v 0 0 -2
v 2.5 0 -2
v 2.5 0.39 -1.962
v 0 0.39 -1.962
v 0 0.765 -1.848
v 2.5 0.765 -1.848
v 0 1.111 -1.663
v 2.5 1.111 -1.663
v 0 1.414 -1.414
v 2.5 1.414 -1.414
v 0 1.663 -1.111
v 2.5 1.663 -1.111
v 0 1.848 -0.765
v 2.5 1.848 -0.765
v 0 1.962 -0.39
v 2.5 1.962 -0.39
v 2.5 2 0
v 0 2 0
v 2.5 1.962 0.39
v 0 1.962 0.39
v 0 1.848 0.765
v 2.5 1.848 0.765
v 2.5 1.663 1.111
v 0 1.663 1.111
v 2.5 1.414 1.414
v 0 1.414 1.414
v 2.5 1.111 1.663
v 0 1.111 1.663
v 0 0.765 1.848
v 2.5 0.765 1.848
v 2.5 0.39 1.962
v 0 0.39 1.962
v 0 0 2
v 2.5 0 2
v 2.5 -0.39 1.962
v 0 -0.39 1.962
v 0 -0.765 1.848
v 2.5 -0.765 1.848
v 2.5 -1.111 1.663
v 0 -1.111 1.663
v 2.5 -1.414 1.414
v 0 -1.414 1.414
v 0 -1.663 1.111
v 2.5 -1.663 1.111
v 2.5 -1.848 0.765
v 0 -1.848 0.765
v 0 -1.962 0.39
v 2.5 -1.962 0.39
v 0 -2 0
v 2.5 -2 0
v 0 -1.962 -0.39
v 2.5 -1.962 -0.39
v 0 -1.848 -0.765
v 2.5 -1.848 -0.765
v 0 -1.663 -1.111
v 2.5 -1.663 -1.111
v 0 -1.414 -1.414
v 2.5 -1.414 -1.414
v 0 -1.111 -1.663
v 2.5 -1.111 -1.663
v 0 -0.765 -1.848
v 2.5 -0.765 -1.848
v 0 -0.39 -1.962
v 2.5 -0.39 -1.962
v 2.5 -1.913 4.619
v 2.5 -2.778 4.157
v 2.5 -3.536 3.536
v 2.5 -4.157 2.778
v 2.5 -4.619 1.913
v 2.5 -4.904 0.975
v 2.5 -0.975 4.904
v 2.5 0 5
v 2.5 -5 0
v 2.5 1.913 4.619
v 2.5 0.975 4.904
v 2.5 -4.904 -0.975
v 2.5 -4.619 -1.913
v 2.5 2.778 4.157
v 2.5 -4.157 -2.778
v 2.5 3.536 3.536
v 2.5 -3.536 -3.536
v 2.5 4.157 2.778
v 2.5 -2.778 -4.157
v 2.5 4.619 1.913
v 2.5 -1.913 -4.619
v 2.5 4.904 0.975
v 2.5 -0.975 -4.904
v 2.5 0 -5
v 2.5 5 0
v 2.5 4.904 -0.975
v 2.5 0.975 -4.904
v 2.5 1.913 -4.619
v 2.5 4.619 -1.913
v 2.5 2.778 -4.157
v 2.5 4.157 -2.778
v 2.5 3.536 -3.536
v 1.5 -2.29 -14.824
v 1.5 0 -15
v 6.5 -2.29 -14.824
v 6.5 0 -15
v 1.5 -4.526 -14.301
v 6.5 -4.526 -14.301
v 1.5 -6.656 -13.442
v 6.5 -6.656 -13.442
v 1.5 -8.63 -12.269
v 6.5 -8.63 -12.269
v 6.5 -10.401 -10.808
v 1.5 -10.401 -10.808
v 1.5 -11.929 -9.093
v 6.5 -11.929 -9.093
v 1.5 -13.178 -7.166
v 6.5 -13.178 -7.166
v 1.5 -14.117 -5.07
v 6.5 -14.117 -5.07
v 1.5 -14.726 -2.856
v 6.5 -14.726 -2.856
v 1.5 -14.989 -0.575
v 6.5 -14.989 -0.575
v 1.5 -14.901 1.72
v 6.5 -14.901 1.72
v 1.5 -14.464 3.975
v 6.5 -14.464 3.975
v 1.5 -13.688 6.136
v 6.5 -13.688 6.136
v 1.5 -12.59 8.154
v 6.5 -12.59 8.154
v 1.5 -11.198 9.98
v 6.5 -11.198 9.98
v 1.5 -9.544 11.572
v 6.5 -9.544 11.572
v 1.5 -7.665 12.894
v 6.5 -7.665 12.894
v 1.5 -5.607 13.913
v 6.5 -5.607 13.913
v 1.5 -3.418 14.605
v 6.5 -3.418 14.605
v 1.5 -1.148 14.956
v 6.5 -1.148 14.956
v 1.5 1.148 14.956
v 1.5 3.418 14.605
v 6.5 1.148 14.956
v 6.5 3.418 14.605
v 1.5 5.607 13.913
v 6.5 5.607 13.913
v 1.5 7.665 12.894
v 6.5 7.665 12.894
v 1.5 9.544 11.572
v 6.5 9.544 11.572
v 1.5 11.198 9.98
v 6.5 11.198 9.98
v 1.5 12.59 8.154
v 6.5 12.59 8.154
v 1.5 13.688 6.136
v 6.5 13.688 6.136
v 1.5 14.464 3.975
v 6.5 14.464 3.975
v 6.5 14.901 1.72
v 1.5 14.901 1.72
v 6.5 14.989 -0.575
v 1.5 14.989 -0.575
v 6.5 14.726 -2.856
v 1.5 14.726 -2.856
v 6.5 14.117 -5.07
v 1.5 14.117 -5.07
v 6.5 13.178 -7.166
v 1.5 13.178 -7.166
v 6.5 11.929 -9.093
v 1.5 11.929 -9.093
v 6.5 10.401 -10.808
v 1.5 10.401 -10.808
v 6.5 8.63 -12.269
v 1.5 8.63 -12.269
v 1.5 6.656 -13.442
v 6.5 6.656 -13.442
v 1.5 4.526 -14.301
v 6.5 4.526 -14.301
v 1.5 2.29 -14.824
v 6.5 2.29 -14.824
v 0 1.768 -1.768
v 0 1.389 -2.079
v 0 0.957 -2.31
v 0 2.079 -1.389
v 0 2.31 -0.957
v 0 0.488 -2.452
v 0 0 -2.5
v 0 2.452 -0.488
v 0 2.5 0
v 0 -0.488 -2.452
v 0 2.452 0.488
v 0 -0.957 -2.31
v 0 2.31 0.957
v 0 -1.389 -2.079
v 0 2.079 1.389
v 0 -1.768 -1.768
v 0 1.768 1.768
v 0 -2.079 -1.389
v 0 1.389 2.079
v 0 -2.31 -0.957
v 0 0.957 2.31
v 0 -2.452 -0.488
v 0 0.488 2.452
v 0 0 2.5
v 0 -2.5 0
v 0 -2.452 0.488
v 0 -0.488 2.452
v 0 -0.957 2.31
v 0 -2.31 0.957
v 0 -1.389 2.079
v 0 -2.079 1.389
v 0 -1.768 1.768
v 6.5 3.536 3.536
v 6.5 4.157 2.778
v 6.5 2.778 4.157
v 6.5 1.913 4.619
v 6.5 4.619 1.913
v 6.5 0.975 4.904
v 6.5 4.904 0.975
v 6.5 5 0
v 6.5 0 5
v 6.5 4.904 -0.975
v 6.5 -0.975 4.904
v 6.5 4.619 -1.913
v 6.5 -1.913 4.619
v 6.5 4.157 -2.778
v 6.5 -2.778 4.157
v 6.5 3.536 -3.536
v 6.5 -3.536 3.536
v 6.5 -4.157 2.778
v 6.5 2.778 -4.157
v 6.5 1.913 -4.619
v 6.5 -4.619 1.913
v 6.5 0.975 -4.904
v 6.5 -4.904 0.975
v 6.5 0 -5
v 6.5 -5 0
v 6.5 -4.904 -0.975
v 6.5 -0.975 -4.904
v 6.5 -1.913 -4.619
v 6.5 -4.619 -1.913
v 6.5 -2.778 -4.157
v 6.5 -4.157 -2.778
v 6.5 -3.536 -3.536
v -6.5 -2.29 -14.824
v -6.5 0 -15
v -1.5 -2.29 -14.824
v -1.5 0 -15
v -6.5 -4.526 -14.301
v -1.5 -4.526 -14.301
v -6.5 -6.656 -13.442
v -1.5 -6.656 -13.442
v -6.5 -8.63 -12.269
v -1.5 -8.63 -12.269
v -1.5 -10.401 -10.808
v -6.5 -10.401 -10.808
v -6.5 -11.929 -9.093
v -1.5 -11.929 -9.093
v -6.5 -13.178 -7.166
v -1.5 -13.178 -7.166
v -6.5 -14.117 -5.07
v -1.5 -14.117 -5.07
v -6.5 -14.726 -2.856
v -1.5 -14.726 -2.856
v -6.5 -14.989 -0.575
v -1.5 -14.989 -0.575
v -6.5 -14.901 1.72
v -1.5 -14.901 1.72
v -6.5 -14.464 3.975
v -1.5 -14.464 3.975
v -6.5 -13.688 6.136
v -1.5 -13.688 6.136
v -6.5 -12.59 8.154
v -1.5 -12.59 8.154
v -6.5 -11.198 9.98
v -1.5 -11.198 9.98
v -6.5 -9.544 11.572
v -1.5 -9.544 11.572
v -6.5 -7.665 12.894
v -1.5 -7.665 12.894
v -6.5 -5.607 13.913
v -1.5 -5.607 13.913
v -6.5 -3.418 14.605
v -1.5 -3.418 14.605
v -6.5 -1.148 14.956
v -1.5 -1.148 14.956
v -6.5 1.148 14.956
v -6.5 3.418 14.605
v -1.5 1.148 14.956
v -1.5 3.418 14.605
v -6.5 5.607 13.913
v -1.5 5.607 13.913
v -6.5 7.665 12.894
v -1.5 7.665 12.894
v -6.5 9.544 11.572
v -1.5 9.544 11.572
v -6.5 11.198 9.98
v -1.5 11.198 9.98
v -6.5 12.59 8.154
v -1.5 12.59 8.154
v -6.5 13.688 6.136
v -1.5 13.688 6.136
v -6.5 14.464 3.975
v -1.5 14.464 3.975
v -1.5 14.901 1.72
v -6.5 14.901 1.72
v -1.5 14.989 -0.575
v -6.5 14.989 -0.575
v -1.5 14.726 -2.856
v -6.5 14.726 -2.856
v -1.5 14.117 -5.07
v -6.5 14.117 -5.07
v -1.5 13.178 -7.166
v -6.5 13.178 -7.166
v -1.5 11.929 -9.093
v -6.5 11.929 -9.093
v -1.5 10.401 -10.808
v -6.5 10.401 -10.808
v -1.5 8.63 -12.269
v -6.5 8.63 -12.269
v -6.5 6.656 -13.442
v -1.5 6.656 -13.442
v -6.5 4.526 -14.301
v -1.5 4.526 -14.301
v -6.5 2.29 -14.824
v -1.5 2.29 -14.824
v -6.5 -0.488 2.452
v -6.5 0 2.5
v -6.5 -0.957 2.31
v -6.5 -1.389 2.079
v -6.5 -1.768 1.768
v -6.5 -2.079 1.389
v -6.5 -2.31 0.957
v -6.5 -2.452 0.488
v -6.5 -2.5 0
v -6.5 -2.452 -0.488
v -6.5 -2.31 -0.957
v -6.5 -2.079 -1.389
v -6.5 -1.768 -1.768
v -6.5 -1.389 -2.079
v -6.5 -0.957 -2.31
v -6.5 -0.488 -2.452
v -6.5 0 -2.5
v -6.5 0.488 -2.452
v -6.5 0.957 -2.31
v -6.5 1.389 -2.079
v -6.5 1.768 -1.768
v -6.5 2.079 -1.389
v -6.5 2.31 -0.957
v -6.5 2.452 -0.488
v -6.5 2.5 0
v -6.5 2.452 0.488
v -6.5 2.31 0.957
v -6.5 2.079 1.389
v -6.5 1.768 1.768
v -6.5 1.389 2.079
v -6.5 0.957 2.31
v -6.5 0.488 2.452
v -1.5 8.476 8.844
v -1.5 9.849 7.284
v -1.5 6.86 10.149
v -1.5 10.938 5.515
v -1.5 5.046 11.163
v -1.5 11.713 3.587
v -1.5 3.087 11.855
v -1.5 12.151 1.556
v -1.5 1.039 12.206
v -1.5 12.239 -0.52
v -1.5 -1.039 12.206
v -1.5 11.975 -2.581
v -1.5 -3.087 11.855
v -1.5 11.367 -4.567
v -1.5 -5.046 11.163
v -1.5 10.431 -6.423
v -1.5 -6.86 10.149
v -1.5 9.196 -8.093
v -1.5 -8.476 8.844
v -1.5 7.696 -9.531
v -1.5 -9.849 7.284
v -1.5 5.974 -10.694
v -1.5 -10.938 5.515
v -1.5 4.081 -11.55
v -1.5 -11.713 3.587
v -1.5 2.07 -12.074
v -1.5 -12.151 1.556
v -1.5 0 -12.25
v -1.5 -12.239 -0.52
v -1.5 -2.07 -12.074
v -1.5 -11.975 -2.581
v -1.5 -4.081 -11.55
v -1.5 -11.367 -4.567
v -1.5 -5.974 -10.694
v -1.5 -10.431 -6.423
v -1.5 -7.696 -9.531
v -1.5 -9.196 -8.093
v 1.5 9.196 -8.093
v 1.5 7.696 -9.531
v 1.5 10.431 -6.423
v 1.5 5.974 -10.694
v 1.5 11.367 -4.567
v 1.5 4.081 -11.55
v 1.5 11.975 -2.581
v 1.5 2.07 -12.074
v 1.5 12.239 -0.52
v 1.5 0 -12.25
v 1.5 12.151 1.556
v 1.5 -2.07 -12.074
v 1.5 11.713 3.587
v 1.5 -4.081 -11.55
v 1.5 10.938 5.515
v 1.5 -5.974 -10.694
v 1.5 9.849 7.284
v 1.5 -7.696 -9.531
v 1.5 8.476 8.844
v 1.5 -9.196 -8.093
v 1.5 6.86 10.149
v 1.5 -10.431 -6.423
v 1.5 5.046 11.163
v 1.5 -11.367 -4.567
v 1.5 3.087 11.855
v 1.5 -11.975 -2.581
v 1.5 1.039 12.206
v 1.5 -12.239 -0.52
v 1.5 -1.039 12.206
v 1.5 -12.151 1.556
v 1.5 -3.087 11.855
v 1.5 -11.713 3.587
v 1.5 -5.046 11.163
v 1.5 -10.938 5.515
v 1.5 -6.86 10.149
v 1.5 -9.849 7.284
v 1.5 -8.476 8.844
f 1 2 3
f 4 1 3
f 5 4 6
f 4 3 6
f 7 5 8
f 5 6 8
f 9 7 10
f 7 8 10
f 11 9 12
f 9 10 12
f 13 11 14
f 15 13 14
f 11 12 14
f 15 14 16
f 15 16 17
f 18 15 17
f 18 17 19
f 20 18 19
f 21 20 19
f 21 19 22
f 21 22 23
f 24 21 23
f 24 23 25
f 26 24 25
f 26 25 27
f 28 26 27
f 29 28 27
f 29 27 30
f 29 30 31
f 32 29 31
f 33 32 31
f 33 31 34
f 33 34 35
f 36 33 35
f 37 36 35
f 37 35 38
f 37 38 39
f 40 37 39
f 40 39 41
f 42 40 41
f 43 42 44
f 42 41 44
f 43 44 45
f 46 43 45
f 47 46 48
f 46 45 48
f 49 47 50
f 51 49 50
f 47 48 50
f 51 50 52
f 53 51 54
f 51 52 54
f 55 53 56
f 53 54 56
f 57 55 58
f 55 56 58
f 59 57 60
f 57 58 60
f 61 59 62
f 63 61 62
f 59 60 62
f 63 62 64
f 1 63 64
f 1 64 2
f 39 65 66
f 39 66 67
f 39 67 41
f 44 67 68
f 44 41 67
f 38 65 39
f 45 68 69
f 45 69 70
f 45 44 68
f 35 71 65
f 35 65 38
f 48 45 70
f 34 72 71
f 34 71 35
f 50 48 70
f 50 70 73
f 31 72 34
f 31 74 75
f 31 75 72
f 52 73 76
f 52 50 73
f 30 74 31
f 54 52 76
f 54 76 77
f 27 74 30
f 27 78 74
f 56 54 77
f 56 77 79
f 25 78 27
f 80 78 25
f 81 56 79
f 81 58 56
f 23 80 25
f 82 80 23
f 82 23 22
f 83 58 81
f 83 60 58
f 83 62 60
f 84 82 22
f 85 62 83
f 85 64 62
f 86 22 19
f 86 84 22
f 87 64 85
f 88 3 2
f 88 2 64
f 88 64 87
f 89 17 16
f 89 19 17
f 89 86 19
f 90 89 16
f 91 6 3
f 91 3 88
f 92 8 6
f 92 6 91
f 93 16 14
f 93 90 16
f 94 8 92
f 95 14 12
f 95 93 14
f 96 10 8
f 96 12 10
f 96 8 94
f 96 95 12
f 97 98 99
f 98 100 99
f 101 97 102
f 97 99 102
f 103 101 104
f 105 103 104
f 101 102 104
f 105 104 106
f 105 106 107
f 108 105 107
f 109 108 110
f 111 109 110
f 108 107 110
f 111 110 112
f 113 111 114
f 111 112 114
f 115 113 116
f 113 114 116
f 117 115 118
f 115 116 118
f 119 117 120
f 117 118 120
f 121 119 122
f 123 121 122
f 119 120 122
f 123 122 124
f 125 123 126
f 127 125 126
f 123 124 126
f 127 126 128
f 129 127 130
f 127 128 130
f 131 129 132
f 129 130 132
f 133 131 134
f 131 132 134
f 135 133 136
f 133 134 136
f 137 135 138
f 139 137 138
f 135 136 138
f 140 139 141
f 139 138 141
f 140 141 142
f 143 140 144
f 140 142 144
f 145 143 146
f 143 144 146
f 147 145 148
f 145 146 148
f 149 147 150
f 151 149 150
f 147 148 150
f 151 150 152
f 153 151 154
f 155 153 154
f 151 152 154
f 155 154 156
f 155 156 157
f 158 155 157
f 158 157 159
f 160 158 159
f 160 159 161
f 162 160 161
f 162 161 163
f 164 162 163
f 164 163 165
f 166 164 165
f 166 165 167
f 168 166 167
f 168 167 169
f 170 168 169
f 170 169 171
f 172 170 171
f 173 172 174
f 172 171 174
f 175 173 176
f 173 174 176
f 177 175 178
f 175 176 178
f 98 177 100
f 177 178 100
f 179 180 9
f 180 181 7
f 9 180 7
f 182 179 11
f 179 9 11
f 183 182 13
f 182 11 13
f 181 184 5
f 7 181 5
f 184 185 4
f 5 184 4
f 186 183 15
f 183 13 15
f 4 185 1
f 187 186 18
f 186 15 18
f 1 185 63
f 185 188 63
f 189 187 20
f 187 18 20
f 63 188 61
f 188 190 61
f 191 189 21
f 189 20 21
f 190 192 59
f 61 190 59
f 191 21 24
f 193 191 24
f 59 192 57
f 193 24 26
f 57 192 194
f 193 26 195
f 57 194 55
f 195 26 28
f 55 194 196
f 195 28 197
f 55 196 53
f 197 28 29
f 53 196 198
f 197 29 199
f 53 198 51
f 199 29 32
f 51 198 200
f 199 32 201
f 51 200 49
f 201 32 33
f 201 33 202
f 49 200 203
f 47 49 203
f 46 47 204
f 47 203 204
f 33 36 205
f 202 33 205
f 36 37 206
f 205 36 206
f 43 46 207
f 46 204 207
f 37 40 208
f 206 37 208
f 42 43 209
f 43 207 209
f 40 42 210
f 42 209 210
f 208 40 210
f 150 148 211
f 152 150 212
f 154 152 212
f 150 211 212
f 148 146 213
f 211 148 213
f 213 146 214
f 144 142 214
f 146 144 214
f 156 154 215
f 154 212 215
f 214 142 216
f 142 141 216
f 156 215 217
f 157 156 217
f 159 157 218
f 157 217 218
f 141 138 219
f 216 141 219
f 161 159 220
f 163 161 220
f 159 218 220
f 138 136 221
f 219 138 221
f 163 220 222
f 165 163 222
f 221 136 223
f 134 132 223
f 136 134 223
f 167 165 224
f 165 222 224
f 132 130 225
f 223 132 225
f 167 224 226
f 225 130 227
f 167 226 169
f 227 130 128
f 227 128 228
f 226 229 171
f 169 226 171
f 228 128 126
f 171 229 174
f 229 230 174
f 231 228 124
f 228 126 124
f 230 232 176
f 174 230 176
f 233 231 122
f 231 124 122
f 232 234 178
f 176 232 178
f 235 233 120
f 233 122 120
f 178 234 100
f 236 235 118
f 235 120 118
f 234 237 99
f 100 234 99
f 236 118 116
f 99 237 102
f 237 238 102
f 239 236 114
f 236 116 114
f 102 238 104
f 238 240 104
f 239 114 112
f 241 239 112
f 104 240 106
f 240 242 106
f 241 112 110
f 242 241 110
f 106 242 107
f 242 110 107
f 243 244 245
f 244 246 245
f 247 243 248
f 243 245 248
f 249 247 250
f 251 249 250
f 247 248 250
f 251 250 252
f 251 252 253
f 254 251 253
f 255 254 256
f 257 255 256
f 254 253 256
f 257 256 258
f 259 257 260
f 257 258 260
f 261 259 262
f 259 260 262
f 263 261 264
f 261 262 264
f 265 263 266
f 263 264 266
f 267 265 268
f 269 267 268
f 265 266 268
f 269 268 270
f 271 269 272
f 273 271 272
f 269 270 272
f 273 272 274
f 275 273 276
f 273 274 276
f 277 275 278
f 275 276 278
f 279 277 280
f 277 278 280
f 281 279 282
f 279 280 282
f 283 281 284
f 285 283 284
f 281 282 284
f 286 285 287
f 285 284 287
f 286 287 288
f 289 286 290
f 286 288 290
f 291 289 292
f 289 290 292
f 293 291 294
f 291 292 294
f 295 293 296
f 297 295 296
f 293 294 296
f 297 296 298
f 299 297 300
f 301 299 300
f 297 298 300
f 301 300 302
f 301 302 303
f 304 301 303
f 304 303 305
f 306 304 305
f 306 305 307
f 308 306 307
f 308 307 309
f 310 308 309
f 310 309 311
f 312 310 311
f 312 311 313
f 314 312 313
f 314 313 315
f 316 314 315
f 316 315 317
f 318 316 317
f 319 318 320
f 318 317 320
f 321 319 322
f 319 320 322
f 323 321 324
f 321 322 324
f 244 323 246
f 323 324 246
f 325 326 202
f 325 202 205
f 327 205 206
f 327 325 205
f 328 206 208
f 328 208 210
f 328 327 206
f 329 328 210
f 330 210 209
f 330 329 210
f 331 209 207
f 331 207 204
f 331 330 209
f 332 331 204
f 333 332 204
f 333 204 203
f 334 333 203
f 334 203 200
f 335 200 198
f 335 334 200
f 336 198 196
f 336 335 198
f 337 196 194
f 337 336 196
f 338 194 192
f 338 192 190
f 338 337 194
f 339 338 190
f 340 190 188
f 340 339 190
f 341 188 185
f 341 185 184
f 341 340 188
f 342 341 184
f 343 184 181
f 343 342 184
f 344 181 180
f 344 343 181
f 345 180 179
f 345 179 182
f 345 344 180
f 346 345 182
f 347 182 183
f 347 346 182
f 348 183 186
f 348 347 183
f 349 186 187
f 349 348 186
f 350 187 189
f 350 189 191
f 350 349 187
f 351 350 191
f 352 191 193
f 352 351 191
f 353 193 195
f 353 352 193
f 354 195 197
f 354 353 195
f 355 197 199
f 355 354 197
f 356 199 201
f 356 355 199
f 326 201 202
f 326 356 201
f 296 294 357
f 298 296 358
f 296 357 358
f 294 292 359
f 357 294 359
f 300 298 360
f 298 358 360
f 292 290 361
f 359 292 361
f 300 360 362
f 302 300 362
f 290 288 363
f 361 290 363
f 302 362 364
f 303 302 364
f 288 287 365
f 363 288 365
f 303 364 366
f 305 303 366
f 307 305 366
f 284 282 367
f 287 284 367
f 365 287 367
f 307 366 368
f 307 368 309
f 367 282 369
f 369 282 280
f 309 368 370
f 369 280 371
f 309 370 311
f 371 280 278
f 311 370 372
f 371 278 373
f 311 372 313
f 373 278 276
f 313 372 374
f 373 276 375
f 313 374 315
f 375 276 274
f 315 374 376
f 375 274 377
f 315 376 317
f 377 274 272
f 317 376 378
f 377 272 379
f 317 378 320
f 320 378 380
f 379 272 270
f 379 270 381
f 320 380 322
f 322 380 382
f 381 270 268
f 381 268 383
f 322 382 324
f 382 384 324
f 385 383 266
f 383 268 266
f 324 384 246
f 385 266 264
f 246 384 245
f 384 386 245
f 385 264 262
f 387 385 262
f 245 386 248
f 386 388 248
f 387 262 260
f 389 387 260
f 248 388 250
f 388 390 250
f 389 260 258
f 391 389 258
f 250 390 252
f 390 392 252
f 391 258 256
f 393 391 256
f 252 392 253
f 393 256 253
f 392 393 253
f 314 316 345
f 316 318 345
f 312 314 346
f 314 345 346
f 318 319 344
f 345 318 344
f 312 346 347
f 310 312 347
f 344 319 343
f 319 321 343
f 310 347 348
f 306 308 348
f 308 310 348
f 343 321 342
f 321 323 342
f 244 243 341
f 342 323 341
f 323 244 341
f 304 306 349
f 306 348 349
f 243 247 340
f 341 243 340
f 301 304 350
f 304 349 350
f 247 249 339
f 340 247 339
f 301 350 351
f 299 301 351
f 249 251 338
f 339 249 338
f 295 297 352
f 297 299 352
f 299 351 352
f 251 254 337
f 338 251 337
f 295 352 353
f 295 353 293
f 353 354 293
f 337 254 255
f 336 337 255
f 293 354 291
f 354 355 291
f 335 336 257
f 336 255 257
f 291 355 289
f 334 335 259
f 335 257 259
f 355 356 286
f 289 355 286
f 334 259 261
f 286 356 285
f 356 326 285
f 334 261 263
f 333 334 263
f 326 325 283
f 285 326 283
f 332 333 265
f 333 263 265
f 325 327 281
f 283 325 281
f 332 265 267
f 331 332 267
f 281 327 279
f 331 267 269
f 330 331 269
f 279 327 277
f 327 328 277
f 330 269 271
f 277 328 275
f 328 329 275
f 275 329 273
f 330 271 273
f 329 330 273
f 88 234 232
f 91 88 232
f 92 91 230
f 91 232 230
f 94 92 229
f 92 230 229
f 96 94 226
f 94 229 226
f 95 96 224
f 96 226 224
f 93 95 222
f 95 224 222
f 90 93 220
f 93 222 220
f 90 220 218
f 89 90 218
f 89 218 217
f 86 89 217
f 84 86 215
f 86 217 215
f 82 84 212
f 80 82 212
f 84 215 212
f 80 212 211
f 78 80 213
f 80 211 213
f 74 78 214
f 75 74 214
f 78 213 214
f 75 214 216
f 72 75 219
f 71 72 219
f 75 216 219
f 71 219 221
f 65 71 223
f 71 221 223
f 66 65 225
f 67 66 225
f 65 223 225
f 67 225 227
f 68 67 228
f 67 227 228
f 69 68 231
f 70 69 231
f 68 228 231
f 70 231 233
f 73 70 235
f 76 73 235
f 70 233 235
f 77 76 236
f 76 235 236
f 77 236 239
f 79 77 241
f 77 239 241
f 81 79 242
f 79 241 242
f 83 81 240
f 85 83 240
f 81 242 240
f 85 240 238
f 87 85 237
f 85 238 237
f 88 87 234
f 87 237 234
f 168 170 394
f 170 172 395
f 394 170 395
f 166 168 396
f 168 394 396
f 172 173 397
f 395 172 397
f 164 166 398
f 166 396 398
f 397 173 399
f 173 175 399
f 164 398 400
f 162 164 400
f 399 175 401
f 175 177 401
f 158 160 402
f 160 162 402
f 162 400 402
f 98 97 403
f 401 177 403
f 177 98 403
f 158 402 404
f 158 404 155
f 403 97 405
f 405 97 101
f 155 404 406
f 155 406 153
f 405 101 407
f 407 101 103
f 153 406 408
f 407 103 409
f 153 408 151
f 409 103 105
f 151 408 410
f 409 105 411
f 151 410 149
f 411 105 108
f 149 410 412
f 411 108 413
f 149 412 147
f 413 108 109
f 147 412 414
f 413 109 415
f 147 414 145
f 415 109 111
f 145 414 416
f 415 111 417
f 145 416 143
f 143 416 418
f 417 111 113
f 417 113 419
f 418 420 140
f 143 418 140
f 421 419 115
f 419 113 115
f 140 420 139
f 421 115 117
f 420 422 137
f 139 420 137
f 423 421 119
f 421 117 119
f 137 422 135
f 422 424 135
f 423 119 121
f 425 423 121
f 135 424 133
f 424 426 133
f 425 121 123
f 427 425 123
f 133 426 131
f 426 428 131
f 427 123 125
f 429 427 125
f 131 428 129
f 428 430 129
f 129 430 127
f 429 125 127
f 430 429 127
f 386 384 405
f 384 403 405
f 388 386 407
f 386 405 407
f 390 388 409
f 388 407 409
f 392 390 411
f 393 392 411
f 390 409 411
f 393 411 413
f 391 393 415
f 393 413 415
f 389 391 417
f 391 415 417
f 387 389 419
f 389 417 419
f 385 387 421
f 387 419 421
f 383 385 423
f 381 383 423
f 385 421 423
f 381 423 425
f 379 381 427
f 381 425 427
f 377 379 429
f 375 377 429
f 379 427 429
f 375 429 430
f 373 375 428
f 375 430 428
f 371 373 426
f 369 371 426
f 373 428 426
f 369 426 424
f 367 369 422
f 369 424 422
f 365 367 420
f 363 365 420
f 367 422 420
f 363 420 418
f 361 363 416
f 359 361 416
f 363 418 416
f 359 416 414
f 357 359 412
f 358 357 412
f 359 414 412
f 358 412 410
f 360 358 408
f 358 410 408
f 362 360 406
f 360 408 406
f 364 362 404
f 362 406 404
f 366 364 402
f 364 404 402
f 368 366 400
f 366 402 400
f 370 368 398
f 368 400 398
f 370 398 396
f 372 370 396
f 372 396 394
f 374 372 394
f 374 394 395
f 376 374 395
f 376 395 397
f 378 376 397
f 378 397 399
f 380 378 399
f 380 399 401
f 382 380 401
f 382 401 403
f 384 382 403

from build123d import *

# Parameters (mm, degrees)
SKETCH2_R          = 5
CUT_EXTRUDE1_DEPTH = 4
CUT_EXTRUDE2_START = 4
SKETCH3_R          = 2
CUT_EXTRUDE2_DEPTH = 6.5
CUT_EXTRUDE4_START = -9
SKETCH4_R          = 2.5
CUT_EXTRUDE4_DEPTH = 6.5


with BuildPart() as part:
    # Sketch1 → Revolve1 (revolve)
    with BuildSketch(Plane.XY, mode=Mode.PRIVATE) as revolve1_sk:
        Polygon((-1.5, 15), (-1.5, 12.25), (1.5, 12.25), (1.5, 15), (6.5, 15), (6.5, 0), (-6.5, 0), (-6.5, 15), align=None)
    revolve(revolve1_sk.sketch.rotate(Axis((6.5, 0, 0), (-1, 0, 0)), 90), axis=Axis((6.5, 0, 0), (-1, 0, 0)))

    # Sketch2 → Cut-Extrude1 (cut)
    with BuildSketch(Plane(origin=(6.5, 0, 0), x_dir=(0, 0, -1), z_dir=(1, 0, 0))):
        Circle(SKETCH2_R)
    extrude(amount=-CUT_EXTRUDE1_DEPTH, mode=Mode.SUBTRACT)

    # Sketch3 → Cut-Extrude2 (cut)
    with BuildSketch(Plane(origin=(2.5, 0, 0), x_dir=(0, 0, -1), z_dir=(1, 0, 0)).offset(CUT_EXTRUDE2_START)):
        Circle(SKETCH3_R)
    extrude(amount=-CUT_EXTRUDE2_DEPTH, mode=Mode.SUBTRACT)

    # Sketch4 → Cut-Extrude4 (cut)
    with BuildSketch(Plane(origin=(2.5, 0, 0), x_dir=(0, 0, -1), z_dir=(1, 0, 0)).offset(CUT_EXTRUDE4_START)):
        with Locations(Location((0, 0, 0), (0, 0, 180))):
            Circle(SKETCH4_R)
    extrude(amount=CUT_EXTRUDE4_DEPTH, mode=Mode.SUBTRACT)


solid = part.part
